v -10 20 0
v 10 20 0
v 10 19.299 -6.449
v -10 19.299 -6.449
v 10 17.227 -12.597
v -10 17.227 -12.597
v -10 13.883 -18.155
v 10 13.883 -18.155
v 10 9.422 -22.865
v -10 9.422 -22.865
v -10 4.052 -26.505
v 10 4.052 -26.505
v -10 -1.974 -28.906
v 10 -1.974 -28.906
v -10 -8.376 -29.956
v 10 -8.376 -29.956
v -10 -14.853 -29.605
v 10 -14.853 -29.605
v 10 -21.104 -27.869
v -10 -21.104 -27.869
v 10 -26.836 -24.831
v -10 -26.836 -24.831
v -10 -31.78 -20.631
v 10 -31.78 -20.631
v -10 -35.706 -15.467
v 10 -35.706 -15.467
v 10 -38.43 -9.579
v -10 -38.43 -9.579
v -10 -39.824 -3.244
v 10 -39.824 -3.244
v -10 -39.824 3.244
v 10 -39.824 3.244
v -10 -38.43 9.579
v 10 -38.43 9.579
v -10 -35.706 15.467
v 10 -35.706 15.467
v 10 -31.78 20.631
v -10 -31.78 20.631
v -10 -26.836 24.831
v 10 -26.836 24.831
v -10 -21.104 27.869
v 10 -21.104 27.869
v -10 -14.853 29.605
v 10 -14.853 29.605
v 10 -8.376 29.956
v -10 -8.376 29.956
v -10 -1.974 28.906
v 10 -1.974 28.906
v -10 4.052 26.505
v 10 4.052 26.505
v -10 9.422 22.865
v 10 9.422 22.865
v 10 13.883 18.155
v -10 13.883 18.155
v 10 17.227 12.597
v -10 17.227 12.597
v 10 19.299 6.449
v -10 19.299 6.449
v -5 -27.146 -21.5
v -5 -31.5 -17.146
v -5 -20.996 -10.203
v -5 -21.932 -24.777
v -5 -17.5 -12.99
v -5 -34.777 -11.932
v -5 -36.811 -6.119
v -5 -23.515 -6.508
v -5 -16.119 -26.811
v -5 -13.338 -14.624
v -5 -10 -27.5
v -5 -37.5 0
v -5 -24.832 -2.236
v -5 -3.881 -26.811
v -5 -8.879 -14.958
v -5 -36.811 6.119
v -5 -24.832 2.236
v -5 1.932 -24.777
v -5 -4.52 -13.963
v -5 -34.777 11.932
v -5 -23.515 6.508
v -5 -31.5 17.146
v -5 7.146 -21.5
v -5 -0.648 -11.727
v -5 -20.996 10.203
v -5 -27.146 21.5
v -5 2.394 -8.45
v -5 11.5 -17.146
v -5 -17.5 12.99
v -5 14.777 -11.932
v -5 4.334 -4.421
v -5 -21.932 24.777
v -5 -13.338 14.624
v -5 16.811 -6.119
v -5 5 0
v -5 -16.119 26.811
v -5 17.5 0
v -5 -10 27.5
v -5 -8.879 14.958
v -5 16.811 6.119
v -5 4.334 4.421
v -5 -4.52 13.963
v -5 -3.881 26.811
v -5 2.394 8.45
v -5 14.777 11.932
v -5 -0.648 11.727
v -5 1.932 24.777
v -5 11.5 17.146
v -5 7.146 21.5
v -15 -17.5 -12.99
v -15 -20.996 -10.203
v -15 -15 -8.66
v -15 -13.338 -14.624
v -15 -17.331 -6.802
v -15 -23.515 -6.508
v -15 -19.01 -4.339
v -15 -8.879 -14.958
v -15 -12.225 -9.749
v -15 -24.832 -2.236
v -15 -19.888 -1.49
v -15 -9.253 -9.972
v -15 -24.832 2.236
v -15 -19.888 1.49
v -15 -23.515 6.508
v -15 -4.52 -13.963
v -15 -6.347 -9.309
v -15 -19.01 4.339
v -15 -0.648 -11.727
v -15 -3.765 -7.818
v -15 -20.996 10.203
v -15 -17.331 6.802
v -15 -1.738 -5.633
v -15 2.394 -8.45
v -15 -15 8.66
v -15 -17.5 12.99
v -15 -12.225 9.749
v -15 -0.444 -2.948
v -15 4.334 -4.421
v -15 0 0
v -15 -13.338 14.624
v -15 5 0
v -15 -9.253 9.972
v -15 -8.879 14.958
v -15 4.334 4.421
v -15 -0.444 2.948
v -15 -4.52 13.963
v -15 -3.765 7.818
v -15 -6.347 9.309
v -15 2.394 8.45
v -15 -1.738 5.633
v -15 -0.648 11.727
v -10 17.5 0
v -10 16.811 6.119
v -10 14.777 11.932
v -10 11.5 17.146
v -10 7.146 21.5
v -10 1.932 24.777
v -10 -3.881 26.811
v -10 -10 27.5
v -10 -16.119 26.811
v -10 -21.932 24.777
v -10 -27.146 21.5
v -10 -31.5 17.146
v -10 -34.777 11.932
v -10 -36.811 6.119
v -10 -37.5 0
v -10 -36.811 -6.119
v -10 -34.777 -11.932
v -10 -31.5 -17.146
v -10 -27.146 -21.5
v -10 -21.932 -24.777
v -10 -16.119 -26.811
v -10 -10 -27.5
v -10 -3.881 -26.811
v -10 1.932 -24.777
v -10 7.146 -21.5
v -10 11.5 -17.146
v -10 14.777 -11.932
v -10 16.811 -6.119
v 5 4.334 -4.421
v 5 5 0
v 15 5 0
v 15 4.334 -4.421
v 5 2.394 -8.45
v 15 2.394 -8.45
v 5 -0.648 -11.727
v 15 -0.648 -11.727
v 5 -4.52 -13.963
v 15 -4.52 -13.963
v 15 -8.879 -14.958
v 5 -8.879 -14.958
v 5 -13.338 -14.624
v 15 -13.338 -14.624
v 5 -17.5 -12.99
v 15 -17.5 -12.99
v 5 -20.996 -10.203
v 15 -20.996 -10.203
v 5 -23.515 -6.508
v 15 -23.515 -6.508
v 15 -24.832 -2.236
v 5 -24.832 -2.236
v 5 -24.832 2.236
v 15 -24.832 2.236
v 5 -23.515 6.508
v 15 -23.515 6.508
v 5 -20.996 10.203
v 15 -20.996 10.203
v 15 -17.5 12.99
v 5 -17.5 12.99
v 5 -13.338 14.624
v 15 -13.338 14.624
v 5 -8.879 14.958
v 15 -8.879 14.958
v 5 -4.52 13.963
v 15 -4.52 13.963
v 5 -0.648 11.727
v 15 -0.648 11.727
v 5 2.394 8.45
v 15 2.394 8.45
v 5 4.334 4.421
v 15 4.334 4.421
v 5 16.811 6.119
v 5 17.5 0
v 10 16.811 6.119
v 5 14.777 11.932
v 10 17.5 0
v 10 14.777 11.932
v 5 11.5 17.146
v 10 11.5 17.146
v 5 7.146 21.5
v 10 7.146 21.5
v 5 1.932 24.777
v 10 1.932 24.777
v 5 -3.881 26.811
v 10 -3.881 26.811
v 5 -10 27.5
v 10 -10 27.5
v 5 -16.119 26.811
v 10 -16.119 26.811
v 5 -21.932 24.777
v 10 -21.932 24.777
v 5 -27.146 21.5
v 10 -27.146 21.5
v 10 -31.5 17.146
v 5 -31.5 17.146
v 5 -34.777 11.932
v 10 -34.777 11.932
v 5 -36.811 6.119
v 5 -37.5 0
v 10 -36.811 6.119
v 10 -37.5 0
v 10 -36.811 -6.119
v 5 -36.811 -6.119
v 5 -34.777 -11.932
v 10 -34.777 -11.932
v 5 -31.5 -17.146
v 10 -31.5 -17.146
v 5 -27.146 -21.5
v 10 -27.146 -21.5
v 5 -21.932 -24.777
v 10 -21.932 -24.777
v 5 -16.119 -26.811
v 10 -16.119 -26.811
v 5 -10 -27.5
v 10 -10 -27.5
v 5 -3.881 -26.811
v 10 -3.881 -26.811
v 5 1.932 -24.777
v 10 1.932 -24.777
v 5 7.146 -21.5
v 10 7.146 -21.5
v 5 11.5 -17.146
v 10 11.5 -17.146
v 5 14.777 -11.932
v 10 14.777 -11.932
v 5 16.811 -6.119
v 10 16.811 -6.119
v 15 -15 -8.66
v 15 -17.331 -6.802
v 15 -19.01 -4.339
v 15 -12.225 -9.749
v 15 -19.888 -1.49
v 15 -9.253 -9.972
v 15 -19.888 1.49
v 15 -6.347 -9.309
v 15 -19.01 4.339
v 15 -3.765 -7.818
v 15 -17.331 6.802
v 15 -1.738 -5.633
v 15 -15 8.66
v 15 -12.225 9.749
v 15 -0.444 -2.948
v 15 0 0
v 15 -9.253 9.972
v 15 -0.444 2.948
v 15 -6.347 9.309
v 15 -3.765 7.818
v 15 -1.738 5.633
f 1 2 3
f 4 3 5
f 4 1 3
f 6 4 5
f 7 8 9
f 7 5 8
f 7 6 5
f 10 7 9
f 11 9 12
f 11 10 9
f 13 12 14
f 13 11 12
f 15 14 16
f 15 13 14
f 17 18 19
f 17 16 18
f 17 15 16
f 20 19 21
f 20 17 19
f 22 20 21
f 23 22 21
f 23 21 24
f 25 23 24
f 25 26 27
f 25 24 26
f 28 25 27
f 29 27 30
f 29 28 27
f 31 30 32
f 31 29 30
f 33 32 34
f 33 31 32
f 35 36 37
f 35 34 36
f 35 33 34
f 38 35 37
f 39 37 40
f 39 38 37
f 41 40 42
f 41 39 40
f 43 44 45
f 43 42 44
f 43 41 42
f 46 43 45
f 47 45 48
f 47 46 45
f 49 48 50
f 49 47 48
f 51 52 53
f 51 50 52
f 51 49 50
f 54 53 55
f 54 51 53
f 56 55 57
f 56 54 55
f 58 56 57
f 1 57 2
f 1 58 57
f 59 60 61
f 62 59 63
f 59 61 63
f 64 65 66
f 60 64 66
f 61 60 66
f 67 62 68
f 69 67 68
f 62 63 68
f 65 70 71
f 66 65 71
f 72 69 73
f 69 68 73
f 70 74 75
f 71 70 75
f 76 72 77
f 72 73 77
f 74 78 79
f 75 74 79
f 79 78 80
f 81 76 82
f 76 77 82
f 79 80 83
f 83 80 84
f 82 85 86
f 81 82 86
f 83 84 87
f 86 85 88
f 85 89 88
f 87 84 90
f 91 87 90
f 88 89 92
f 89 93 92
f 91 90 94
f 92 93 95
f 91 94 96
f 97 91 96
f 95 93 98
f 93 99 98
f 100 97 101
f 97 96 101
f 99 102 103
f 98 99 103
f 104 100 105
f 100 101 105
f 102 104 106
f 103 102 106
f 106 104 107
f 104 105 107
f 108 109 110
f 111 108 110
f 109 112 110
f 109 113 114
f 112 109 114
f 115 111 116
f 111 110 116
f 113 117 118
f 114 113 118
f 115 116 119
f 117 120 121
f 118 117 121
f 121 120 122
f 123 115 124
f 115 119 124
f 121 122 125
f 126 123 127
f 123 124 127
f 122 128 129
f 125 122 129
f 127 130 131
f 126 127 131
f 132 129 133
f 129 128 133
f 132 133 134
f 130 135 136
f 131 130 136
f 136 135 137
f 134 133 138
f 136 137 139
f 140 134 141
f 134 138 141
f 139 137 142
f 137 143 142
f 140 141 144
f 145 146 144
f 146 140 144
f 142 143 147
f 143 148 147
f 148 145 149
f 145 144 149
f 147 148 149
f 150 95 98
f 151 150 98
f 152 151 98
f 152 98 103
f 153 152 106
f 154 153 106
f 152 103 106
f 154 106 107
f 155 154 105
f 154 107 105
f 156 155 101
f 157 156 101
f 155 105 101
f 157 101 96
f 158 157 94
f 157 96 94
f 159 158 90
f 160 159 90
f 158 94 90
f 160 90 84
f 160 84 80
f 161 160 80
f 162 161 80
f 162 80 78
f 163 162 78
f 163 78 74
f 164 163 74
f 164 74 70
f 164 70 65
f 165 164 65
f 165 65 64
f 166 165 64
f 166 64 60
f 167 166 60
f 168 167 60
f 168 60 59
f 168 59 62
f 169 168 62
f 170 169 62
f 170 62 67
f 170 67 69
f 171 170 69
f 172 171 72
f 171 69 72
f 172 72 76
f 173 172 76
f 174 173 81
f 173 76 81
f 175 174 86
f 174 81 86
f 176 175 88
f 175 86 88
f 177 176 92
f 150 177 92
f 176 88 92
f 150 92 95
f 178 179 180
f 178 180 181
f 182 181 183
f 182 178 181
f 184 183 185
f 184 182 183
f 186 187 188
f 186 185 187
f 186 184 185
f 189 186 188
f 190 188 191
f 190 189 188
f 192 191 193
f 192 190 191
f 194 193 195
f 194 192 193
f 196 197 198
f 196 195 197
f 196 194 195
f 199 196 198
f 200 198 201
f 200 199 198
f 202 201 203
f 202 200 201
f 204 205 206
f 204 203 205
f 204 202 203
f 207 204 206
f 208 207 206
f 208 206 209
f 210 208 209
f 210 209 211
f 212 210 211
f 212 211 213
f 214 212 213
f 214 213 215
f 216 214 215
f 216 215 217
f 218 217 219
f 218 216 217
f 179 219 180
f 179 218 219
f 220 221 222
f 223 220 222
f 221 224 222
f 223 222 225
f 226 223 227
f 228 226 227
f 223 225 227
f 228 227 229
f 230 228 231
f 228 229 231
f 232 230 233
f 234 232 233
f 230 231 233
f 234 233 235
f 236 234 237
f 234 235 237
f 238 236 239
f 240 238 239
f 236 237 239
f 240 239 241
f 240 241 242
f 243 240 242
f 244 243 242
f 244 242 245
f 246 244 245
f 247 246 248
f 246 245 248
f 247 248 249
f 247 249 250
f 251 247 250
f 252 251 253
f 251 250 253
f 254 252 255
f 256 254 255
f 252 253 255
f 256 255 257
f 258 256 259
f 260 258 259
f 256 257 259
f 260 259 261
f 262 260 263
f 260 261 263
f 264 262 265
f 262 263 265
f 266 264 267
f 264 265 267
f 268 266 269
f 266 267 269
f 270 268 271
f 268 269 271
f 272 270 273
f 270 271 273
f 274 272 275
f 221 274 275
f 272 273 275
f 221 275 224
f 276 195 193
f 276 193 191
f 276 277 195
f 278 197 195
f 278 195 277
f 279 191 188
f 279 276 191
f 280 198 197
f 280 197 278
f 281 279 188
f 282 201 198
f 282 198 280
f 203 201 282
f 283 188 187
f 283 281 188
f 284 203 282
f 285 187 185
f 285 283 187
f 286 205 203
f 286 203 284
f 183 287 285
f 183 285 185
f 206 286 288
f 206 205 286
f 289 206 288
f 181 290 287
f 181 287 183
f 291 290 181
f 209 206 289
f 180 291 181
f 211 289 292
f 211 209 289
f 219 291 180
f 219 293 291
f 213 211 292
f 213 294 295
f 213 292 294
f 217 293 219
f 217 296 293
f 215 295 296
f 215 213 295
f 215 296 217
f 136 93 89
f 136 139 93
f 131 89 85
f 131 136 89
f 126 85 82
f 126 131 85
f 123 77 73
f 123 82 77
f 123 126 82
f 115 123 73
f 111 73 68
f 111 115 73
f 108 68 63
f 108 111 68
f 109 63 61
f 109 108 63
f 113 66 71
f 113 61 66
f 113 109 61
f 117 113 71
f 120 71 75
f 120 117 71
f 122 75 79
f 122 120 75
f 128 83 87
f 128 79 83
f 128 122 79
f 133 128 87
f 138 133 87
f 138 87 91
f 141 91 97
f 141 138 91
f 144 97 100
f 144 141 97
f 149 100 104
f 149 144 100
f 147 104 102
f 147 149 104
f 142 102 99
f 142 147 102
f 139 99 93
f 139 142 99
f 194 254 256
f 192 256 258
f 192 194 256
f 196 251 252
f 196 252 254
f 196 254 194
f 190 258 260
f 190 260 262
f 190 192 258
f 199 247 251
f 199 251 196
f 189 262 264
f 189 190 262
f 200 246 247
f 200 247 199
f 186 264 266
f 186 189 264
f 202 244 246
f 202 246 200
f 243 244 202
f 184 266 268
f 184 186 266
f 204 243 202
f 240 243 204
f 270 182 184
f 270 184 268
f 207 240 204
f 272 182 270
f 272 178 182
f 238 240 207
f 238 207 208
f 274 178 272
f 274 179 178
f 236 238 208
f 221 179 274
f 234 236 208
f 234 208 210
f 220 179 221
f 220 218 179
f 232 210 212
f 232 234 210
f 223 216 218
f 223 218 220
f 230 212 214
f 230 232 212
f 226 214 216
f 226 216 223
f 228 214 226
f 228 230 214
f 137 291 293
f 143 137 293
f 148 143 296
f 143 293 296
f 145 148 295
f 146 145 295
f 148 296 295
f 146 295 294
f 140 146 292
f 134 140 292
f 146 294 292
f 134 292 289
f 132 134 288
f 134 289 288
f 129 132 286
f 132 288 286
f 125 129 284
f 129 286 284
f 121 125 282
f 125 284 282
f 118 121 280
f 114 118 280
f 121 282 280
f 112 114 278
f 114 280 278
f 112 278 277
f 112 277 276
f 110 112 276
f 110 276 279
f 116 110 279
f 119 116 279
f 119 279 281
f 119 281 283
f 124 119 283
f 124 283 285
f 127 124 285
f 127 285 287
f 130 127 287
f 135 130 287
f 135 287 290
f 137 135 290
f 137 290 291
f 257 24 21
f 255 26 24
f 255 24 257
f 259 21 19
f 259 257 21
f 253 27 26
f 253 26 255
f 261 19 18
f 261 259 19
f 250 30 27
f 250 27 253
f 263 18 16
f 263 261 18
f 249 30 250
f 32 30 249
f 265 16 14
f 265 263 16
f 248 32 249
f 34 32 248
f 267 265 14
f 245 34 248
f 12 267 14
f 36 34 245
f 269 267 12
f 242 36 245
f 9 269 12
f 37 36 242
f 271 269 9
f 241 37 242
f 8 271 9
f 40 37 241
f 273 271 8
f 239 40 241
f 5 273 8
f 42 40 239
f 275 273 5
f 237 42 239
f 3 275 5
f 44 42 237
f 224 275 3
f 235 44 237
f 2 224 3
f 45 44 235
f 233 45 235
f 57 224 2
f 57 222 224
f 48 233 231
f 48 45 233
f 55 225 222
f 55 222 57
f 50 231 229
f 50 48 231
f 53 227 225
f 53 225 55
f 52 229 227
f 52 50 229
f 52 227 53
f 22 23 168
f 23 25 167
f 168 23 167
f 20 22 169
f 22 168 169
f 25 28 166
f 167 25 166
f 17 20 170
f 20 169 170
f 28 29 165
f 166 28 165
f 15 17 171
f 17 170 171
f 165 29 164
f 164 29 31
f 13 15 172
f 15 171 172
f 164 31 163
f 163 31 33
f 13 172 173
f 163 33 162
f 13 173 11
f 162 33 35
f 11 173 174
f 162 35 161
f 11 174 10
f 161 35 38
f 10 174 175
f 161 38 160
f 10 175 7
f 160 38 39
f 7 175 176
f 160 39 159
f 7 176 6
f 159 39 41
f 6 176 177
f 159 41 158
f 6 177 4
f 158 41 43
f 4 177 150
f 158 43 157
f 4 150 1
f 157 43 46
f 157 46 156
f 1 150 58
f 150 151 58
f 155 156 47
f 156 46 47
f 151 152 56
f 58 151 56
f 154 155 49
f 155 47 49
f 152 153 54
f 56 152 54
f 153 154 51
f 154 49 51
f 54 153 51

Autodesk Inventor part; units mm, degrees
ref_plane "YZ Plane" through (0, 0, 0) normal (1, 0, 0) x (0, 1, 0)
ref_plane "XZ Plane" through (0, 0, 0) normal (0, 1, 0) x (-1, 0, 0)
ref_plane "XY Plane" through (0, 0, 0) normal (0, 0, 1) x (1, 0, 0)
sketch "Boceto1" plane through (0, 0, 0) normal (0, 0, 1) x (1, 0, 0)
  line L0 (-15, 0) -> (15, 0)
  line L1 (15, 0) -> (15, 5)
  line L2 (15, 5) -> (5, 5)
  line L3 (5, 5) -> (5, 17.5)
  line L4 (5, 17.5) -> (10, 17.5)
  line L5 (10, 17.5) -> (10, 20)
  line L6 (10, 20) -> (-10, 20)
  line L7 (-10, 20) -> (-10, 17.5)
  line L8 (-10, 17.5) -> (-5, 17.5)
  line L9 (-5, 17.5) -> (-5, 5)
  line L10 (-5, 5) -> (-15, 5)
  line L11 (-15, 5) -> (-15, 0)
  line L12 (-15, -10) -> (15, -10)
  point P0 (0, 0)
  point P1 (0, 0)
  point P2 (7.5, 17.5)
  point P3 (10, 5)
  dimension "d6" = 30
  dimension "d7" = 20
  dimension "d8" = 5
  dimension "d9" = 60
  dimension "d10" = 55
  dimension "d11" = 30
  dimension "d12" = 20
revolve "Revolución1" add sketch "Boceto1" angle 360 about axis through (-15, -10, 0) along (1, 0, 0)
properties part number "Rueda polea"
